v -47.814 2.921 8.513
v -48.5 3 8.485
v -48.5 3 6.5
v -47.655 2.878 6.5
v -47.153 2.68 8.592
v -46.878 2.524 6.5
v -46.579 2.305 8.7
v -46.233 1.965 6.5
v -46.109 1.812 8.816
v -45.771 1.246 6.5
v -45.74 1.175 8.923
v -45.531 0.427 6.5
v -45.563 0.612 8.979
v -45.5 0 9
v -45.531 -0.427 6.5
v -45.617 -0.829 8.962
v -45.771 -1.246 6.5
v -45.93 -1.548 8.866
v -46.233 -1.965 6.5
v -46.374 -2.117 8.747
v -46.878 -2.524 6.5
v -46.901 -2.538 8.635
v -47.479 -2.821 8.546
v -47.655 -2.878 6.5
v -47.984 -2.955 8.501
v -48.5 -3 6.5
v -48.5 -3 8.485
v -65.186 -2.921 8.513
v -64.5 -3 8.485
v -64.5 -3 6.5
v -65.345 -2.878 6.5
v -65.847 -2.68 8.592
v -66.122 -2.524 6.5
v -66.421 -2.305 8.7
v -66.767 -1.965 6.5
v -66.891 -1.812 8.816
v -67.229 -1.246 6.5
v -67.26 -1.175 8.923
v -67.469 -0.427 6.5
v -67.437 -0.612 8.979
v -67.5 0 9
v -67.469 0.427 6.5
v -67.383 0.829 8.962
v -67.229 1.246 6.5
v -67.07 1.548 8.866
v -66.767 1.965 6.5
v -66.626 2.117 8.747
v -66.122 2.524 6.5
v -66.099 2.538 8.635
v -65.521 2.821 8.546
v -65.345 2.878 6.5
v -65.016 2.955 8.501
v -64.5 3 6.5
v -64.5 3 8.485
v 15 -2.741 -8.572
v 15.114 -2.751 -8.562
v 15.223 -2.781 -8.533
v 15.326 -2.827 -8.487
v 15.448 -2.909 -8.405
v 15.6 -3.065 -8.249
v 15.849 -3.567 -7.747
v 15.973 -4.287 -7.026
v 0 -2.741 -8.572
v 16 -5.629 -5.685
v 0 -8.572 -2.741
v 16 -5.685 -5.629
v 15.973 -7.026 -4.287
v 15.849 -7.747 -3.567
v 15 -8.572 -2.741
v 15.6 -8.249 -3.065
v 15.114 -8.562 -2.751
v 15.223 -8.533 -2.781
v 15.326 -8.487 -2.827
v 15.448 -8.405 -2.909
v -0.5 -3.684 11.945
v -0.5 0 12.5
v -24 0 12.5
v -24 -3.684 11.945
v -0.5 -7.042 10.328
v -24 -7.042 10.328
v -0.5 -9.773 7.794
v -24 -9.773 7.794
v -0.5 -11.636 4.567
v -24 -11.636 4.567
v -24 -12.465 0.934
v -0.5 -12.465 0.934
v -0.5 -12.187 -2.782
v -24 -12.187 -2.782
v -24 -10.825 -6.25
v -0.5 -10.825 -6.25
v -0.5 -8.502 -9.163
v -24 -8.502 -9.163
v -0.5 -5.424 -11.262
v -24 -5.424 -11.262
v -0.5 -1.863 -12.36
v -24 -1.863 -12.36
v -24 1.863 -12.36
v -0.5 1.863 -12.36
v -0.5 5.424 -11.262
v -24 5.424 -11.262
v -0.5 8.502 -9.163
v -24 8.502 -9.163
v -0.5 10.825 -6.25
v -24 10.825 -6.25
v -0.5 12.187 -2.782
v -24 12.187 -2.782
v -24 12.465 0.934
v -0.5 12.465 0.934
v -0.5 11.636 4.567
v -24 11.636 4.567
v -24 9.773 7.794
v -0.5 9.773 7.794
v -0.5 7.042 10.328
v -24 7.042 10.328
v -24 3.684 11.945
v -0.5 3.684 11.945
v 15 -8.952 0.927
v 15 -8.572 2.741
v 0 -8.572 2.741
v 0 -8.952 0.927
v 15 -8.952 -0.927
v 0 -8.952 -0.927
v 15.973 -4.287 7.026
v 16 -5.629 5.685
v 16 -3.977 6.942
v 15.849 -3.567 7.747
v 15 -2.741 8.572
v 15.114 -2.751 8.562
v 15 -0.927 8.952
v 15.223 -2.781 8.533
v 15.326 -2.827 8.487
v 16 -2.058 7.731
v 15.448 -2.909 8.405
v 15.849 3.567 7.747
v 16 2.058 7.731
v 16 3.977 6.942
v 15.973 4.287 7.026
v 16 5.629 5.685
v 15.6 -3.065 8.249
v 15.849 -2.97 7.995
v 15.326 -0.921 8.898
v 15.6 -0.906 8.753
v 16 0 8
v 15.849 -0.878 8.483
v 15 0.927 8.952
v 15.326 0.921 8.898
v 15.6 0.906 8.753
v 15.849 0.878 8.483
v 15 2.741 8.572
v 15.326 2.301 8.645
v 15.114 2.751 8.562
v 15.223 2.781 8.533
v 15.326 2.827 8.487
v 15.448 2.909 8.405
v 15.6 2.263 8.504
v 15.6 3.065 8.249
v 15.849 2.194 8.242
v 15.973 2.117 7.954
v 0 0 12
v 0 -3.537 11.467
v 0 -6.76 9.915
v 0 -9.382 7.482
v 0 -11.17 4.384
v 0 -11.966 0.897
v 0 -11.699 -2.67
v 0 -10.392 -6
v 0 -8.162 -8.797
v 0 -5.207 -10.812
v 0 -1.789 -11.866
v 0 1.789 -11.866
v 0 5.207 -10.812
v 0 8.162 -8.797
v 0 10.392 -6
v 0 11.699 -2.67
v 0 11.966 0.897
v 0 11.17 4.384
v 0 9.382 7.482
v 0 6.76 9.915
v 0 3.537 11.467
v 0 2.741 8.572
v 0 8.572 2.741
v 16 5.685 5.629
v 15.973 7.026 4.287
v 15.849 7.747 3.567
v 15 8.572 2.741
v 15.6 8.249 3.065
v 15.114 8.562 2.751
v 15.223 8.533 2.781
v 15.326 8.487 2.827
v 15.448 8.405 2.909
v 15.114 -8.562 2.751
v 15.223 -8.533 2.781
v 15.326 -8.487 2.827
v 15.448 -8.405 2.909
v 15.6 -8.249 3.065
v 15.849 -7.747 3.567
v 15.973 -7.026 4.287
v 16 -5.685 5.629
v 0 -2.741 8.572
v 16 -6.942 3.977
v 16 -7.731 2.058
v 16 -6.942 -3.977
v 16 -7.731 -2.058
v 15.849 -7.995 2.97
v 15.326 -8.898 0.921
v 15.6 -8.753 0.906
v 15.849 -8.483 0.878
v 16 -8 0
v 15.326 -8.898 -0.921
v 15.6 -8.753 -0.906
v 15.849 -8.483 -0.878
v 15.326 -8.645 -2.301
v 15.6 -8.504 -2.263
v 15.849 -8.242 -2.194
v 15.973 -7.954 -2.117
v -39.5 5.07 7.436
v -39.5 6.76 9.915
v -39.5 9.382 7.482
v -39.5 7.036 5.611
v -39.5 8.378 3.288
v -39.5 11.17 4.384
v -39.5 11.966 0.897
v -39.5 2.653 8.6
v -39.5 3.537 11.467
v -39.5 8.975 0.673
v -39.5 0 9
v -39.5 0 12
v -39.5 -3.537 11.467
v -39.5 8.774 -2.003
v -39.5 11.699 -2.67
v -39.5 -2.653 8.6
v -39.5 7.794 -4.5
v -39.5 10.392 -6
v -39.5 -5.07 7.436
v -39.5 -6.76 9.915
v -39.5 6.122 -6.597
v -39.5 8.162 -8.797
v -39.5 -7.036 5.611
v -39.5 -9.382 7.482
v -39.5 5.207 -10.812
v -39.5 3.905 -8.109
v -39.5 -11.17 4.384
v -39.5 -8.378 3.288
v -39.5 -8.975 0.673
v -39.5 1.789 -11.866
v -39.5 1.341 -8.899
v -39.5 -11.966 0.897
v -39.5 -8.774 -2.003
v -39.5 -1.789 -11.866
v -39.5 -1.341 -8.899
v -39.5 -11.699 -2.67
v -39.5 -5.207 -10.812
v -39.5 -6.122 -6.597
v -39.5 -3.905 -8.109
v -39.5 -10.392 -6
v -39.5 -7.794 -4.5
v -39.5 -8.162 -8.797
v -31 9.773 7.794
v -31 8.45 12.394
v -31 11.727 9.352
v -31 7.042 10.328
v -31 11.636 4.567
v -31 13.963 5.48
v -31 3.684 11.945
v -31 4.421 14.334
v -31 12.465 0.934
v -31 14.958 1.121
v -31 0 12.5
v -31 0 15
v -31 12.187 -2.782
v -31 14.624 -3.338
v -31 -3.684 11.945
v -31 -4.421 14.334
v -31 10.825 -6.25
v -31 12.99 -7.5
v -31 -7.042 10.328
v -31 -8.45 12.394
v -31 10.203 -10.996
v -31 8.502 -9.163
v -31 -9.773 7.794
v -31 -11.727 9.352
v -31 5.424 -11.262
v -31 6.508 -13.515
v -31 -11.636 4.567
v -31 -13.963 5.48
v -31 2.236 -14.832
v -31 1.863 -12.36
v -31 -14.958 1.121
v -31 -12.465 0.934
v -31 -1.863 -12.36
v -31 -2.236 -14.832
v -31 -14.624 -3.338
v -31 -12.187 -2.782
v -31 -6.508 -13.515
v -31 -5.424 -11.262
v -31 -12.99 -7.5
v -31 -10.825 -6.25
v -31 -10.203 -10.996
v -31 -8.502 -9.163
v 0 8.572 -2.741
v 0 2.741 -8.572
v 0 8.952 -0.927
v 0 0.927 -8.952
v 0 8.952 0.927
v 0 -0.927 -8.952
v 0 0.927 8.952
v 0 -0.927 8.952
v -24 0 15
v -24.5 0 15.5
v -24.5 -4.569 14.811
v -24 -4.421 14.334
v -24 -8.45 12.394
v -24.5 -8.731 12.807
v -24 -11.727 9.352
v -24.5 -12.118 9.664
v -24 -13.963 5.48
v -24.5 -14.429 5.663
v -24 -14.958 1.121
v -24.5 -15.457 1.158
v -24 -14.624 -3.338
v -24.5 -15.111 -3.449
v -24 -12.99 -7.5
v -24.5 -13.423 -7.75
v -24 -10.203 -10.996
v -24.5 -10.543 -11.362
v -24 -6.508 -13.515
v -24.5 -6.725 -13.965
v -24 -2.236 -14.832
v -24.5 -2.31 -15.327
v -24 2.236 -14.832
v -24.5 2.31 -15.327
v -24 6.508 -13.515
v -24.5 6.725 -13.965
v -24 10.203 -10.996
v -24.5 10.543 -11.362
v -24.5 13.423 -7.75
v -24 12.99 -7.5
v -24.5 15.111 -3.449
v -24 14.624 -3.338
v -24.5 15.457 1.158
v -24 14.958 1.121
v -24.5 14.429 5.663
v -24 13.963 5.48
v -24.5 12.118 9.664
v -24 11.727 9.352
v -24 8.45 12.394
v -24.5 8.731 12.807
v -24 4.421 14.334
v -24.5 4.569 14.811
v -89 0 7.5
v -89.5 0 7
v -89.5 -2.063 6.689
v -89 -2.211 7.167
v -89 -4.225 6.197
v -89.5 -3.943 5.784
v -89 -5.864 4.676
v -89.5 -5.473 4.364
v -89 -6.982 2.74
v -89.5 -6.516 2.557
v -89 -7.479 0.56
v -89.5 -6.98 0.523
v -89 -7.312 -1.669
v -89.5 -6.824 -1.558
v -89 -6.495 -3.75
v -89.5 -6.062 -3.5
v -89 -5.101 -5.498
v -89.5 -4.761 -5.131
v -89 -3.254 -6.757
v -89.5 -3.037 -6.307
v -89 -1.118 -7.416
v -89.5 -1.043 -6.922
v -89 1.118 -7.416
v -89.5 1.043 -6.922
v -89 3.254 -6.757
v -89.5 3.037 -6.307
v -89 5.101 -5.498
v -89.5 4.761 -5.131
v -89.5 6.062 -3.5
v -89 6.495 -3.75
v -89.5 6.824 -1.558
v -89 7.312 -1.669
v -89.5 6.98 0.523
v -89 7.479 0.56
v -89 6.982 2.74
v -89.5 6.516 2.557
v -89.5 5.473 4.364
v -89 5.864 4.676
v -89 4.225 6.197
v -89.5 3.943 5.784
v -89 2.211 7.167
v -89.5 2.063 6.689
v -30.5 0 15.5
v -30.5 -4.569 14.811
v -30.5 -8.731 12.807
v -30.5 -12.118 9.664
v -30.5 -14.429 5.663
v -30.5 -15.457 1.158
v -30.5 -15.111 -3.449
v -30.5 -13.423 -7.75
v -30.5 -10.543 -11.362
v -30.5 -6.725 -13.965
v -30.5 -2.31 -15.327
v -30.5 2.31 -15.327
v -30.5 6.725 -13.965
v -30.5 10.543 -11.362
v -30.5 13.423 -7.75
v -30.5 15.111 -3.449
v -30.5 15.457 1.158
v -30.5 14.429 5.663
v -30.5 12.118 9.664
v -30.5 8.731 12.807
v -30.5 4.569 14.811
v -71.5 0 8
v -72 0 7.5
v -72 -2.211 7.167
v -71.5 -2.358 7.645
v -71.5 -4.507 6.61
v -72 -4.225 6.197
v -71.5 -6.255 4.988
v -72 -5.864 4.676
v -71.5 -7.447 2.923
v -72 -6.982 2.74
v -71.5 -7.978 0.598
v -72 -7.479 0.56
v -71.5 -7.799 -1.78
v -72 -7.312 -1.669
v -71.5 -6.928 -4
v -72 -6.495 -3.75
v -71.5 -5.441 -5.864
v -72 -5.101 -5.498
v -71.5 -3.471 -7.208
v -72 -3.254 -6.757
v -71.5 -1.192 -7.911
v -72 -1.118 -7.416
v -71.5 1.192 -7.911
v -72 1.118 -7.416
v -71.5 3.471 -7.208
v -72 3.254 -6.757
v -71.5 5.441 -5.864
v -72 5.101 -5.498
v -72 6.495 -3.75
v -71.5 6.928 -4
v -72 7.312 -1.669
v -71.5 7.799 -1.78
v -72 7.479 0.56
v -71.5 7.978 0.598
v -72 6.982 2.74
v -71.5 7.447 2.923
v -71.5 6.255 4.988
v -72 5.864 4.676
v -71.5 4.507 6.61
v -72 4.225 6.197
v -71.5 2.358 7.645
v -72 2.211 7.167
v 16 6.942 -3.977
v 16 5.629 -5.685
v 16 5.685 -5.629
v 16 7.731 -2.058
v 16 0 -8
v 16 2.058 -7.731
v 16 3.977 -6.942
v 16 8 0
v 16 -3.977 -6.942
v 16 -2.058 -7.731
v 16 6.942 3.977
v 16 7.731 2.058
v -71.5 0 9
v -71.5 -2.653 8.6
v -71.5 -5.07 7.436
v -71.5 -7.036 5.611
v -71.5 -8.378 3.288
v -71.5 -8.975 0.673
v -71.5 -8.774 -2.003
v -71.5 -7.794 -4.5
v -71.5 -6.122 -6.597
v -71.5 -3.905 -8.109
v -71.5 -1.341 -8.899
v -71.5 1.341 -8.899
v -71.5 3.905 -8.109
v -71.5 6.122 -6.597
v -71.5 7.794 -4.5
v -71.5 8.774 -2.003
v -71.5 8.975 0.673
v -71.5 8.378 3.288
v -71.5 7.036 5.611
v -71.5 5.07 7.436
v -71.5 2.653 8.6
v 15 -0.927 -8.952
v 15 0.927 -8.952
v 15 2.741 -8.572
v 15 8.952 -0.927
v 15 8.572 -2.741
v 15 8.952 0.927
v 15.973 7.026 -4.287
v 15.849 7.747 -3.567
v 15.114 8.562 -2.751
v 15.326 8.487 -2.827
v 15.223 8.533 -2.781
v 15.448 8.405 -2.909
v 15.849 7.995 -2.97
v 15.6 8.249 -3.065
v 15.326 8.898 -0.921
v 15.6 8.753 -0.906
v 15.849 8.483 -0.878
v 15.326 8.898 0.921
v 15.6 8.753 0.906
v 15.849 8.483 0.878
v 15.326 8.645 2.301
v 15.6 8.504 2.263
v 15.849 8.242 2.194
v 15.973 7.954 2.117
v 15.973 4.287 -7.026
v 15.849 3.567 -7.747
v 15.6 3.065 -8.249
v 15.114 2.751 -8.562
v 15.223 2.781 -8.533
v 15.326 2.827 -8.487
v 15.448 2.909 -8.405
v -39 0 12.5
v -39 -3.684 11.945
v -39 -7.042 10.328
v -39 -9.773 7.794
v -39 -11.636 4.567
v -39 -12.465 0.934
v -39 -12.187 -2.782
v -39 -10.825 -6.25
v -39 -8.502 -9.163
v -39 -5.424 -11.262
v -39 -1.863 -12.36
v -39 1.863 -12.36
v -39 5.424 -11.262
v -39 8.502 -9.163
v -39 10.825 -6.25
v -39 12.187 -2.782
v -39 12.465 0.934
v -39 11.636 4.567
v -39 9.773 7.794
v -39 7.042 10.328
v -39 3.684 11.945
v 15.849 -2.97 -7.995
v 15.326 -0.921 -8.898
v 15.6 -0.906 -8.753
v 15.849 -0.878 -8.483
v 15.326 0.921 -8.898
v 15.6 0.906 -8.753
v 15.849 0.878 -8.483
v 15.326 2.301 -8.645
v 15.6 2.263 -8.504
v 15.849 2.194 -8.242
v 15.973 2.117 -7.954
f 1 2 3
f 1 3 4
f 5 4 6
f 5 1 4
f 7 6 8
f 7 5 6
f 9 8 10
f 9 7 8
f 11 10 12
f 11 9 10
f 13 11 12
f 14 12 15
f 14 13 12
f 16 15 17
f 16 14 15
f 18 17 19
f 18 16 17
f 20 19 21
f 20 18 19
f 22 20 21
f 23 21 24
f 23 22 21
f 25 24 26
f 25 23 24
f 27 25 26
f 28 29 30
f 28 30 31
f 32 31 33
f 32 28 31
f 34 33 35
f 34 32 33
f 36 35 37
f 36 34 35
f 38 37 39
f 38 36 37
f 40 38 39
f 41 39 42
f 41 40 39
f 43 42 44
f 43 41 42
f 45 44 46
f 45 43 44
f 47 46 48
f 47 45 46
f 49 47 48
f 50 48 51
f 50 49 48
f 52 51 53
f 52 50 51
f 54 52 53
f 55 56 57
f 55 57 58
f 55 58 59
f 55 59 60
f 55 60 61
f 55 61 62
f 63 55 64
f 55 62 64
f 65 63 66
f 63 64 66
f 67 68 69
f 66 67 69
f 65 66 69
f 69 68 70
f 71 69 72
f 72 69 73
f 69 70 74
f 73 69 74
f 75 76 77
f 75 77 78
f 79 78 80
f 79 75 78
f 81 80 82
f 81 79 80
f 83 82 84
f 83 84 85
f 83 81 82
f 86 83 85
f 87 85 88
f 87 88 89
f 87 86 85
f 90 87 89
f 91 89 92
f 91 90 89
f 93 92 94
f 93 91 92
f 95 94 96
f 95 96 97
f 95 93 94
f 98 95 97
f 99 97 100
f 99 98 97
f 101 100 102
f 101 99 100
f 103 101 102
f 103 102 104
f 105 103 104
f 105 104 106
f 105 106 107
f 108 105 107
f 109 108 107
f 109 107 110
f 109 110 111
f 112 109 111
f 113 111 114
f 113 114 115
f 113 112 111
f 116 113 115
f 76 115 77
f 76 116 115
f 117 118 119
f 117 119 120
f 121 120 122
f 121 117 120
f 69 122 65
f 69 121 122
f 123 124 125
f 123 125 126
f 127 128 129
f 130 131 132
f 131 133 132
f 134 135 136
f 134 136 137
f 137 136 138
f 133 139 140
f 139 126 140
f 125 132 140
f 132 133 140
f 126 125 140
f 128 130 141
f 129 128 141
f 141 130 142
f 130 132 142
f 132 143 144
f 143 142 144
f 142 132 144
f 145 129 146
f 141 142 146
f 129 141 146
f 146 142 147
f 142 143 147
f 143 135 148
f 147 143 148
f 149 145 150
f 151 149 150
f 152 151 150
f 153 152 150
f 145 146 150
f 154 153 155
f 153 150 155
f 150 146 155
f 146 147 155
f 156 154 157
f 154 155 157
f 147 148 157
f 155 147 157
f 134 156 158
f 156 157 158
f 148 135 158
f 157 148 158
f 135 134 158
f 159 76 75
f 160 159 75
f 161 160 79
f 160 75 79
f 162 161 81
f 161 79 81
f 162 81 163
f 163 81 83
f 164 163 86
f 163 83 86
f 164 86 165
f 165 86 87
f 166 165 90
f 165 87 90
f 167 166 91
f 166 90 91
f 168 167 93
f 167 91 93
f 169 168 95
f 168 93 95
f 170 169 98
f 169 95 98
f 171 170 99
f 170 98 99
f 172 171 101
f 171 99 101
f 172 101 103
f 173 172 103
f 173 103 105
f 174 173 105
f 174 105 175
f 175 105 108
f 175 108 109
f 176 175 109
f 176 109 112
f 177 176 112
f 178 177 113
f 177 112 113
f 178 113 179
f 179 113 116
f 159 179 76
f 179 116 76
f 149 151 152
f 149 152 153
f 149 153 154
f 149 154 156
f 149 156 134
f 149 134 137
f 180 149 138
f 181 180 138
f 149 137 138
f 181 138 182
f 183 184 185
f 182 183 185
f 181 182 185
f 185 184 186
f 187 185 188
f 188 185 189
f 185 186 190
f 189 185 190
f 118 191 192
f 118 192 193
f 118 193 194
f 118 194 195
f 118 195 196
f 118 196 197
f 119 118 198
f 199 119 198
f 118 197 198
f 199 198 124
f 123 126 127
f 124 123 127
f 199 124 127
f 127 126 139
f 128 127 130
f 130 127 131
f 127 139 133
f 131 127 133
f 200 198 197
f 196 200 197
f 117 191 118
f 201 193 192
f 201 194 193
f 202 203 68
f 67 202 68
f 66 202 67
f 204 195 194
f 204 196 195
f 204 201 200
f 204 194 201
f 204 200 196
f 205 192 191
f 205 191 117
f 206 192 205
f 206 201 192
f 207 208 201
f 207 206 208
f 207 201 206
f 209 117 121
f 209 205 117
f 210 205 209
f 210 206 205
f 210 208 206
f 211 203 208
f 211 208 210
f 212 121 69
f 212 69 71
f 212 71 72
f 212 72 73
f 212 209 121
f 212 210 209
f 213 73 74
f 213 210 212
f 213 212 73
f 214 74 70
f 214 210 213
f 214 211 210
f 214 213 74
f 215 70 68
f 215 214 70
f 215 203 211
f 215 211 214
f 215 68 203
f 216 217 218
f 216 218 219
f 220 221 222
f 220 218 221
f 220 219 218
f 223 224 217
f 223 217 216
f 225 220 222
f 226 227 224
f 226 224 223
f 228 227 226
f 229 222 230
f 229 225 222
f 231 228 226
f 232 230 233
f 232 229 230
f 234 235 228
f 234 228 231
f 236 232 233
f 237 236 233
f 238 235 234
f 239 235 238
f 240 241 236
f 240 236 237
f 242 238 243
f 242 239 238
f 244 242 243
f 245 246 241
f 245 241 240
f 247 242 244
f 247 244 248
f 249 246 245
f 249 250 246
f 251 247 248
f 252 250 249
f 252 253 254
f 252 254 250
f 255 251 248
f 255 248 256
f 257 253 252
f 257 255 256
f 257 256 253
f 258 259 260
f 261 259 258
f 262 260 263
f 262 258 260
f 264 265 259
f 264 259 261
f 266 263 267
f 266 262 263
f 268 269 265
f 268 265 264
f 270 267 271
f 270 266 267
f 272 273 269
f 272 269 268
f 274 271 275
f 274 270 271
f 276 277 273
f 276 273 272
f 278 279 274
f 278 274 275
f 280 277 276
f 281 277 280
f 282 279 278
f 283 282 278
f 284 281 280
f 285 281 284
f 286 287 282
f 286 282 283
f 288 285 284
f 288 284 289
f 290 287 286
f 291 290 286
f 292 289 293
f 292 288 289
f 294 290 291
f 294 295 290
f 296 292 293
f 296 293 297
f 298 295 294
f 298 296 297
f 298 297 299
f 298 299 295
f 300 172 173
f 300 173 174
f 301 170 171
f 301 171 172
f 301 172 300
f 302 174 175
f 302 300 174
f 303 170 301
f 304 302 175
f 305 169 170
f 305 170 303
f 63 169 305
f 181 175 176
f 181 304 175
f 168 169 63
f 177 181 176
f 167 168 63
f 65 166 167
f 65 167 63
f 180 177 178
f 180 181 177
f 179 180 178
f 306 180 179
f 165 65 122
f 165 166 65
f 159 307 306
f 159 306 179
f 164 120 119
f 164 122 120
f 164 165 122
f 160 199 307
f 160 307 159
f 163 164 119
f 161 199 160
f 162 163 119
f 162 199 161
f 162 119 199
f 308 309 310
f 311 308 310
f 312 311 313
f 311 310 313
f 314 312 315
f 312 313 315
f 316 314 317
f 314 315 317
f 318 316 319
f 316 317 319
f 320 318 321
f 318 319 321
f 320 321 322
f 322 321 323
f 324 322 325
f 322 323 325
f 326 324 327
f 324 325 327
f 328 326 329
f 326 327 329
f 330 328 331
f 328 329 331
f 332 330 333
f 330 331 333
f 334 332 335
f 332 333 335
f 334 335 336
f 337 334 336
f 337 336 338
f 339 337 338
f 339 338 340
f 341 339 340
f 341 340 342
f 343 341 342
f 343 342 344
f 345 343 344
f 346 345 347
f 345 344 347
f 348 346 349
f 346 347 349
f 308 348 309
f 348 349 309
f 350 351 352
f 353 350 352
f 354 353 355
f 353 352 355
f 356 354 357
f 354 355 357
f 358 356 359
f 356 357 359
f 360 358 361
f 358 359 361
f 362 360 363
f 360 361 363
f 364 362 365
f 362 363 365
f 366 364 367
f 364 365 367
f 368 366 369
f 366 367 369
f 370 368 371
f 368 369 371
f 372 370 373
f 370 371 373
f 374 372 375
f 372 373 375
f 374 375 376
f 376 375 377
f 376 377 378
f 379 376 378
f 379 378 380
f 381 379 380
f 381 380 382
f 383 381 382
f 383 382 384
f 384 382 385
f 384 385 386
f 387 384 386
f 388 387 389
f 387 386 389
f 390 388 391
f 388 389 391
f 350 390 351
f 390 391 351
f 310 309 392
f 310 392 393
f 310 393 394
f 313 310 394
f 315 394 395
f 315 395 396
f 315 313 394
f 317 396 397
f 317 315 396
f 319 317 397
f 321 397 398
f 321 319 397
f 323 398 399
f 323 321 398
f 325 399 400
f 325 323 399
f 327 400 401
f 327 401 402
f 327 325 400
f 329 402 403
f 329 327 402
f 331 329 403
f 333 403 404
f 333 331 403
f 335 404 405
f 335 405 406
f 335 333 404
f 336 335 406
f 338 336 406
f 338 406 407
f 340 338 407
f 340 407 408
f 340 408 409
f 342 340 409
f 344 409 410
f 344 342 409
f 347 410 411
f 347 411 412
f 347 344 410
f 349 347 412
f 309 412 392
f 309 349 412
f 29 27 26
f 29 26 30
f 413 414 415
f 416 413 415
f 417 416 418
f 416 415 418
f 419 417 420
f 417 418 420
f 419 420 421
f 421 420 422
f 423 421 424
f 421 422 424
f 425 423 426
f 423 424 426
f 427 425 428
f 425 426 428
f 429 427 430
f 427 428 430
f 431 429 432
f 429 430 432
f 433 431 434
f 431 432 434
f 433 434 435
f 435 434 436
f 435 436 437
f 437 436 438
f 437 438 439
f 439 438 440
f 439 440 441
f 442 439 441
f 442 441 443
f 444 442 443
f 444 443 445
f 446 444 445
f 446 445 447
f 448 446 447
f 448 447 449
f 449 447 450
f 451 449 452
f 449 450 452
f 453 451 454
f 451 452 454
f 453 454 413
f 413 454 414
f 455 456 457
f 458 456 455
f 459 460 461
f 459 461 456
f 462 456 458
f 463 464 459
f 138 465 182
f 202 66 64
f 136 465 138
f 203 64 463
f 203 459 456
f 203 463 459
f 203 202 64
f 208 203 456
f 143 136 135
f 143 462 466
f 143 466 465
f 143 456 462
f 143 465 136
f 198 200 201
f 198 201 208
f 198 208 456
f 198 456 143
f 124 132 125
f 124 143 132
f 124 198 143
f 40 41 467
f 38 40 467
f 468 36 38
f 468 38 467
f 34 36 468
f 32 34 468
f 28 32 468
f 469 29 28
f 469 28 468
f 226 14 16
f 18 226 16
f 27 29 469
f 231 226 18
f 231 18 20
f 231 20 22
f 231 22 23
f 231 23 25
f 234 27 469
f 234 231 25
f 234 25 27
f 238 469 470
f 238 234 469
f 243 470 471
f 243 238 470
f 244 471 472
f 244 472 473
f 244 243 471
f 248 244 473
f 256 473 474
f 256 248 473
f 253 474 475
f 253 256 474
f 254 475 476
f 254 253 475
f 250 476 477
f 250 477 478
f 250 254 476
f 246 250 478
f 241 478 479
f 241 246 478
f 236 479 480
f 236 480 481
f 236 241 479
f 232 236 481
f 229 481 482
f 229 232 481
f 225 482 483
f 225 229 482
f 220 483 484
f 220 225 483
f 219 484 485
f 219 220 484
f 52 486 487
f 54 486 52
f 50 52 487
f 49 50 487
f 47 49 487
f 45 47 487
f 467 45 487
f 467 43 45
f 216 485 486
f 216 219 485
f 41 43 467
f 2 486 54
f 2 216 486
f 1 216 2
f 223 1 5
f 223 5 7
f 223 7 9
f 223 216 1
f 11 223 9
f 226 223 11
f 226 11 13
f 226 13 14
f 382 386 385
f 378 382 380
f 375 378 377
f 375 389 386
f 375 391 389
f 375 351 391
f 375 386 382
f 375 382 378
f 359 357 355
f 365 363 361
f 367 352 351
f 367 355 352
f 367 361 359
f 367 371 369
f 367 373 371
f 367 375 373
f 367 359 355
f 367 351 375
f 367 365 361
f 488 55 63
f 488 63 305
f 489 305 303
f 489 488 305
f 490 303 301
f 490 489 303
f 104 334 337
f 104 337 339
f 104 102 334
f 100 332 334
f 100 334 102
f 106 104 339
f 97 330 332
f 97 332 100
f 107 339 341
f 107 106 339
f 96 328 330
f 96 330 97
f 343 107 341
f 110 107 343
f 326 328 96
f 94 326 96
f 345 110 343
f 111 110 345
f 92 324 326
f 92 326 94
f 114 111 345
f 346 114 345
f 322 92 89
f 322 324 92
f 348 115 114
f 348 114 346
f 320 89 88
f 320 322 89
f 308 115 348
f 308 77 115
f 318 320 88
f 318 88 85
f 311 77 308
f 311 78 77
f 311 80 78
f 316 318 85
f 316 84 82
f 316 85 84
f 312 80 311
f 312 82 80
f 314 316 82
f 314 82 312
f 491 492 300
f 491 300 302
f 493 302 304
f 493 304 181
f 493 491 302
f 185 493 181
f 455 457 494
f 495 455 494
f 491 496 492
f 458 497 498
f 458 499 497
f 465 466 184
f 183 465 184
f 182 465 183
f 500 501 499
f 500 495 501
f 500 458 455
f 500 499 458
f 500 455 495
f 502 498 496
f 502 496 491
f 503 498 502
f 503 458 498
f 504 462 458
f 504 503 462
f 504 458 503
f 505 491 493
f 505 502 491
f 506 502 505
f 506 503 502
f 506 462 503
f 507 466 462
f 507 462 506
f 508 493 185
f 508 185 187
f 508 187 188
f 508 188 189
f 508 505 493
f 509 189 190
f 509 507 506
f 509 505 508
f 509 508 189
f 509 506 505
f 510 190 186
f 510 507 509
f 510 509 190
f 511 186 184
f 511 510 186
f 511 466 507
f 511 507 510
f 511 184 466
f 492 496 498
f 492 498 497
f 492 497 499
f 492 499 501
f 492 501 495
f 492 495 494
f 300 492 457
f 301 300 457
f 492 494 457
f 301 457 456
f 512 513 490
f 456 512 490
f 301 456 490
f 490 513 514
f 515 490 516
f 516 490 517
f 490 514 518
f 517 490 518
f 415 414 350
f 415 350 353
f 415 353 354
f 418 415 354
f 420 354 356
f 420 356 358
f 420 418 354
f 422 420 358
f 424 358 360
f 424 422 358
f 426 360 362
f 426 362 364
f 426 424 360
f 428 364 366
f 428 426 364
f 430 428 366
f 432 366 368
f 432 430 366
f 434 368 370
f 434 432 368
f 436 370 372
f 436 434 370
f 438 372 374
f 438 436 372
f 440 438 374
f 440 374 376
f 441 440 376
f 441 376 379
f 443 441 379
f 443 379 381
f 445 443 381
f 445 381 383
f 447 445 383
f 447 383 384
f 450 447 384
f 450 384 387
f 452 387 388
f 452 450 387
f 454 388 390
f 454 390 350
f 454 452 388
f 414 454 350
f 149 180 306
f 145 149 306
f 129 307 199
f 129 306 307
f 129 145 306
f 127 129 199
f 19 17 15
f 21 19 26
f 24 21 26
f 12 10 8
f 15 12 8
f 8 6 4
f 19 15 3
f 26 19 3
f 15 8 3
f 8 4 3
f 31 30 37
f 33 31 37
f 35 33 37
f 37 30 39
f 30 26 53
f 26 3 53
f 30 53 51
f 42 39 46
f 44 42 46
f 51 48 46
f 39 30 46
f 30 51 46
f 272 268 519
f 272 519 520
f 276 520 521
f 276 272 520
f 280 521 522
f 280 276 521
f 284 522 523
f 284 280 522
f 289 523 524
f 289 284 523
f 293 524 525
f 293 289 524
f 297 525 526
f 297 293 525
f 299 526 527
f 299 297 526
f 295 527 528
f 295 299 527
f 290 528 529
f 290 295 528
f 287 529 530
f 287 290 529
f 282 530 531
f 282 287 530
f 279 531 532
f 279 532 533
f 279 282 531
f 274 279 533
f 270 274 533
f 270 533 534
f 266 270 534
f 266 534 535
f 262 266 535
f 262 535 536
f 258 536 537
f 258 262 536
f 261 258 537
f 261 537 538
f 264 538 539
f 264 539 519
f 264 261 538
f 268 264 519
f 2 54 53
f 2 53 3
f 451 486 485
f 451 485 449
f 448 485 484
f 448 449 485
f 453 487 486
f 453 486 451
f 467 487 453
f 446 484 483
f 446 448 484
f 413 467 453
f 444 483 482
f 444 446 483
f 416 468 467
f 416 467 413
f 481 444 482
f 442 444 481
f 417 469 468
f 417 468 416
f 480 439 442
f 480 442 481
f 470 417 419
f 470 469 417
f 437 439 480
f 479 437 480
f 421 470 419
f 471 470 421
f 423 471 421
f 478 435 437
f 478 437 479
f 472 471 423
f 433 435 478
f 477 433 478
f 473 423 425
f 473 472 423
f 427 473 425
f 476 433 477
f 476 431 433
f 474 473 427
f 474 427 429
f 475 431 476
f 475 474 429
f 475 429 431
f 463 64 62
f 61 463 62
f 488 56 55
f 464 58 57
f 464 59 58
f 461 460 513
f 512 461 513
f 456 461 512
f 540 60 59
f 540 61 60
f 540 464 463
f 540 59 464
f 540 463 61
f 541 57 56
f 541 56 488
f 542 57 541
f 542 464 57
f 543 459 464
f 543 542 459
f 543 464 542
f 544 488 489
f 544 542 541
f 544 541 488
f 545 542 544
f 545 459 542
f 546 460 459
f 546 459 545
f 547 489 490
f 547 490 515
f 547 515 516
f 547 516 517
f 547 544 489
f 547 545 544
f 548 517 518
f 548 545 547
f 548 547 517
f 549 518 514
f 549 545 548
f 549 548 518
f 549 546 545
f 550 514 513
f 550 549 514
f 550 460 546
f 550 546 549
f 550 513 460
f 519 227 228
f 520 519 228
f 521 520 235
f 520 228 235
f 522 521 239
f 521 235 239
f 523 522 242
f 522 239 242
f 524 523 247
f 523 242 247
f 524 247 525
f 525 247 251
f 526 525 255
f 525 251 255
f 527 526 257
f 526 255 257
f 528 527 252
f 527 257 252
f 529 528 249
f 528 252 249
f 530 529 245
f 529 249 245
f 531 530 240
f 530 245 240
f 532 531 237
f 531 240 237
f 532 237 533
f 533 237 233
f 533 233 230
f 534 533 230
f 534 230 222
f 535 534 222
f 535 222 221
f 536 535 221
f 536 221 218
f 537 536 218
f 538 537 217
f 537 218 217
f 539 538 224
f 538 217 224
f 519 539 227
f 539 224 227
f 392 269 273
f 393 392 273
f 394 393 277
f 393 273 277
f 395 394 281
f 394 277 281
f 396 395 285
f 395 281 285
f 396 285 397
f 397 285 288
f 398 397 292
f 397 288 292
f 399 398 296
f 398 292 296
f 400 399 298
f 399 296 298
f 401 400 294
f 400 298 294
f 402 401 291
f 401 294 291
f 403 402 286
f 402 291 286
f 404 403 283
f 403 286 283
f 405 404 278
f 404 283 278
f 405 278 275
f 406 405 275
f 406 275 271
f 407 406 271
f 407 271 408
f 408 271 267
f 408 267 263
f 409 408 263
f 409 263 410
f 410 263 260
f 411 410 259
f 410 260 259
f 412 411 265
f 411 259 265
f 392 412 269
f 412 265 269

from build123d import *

# Parameters (mm, degrees)
CUT_EXTRUDE_1_DEPTH = 16
CUT_EXTRUDE_2_DEPTH = 2.5
FILLET_1_R          = 1
CHAMFER_1_SIZE      = 0.5


with BuildPart() as part:
    # 草图2 → 旋转1 (revolve)
    with BuildSketch(Plane.XY, mode=Mode.PRIVATE) as revolve_1_sk:
        Polygon((-89.5, 0), (-89.5, 7.5), (-71.5, 7.5), (-71.5, 9), (-39.5, 9), (-39.5, 12.5), (-31, 12.5), (-31, 15.5), (-24, 15.5), (-24, 12.5), (0, 12.5), (0, 9), (16, 9), (16, 0), align=None)
    revolve(revolve_1_sk.sketch.rotate(Axis((-90.878838174, 0, 0), (1, 0, 0)), 90), axis=Axis((-90.878838174, 0, 0), (1, 0, 0)))

    # 草图3 → 切除-拉伸1 (cut)
    with BuildSketch(Plane(origin=(16, 0, 0), x_dir=(0, 0, -1), z_dir=(1, 0, 0))):
        with BuildLine():
            ThreePointArc((-2.741378302, 8.572330197), (-6.363961031, 6.363961031), (-8.572330197, 2.741378302))
            Line((-8.572330197, 2.741378302), (-2.741378302, 8.572330197))
        make_face()
        with BuildLine():
            Line((-2.741378302, -8.572330197), (-8.572330197, -2.741378302))
            ThreePointArc((-8.572330197, -2.741378302), (-6.363961031, -6.363961031), (-2.741378302, -8.572330197))
        make_face()
        with BuildLine():
            Line((8.572330197, -2.741378302), (2.741378302, -8.572330197))
            ThreePointArc((2.741378302, -8.572330197), (6.363961031, -6.363961031), (8.572330197, -2.741378302))
        make_face()
        with BuildLine():
            ThreePointArc((8.572330197, 2.741378302), (6.363961031, 6.363961031), (2.741378302, 8.572330197))
            Line((2.741378302, 8.572330197), (8.572330197, 2.741378302))
        make_face()
    extrude(amount=-CUT_EXTRUDE_1_DEPTH, mode=Mode.SUBTRACT)

    # 草图5 → 切除-拉伸2 (cut)
    with BuildSketch(Plane.XY.offset(9)):
        with BuildLine():
            Line((-64.5, 3), (-48.5, 3))
            ThreePointArc((-48.5, 3), (-45.5, 0), (-48.5, -3))
            Line((-48.5, -3), (-64.5, -3))
            ThreePointArc((-64.5, -3), (-67.5, 0), (-64.5, 3))
        make_face()
    extrude(amount=-CUT_EXTRUDE_2_DEPTH, mode=Mode.SUBTRACT)

    # 圆角1
    fillet_1_edges = [part.edges().sort_by_distance(p)[0] for p in [
        (16, -9, 0),
        (16, 0, -9),
        (16, 9, 0),
        (16, 0, 9),
    ]]
    fillet(fillet_1_edges, radius=FILLET_1_R - 0.0001)  # a hair under: the kernel refuses the full size

    # 倒角1
    chamfer_1_edges = [part.edges().sort_by_distance(p)[0] for p in [
        (0, 0, -12.5),
        (-24, 0, -15.5),
        (-31, 0, -15.5),
        (-39.5, 0, -12.5),
        (-71.5, 0, -7.5),
        (-89.5, 0, -7.5),
    ]]
    chamfer(chamfer_1_edges, length=CHAMFER_1_SIZE)


solid = part.part
